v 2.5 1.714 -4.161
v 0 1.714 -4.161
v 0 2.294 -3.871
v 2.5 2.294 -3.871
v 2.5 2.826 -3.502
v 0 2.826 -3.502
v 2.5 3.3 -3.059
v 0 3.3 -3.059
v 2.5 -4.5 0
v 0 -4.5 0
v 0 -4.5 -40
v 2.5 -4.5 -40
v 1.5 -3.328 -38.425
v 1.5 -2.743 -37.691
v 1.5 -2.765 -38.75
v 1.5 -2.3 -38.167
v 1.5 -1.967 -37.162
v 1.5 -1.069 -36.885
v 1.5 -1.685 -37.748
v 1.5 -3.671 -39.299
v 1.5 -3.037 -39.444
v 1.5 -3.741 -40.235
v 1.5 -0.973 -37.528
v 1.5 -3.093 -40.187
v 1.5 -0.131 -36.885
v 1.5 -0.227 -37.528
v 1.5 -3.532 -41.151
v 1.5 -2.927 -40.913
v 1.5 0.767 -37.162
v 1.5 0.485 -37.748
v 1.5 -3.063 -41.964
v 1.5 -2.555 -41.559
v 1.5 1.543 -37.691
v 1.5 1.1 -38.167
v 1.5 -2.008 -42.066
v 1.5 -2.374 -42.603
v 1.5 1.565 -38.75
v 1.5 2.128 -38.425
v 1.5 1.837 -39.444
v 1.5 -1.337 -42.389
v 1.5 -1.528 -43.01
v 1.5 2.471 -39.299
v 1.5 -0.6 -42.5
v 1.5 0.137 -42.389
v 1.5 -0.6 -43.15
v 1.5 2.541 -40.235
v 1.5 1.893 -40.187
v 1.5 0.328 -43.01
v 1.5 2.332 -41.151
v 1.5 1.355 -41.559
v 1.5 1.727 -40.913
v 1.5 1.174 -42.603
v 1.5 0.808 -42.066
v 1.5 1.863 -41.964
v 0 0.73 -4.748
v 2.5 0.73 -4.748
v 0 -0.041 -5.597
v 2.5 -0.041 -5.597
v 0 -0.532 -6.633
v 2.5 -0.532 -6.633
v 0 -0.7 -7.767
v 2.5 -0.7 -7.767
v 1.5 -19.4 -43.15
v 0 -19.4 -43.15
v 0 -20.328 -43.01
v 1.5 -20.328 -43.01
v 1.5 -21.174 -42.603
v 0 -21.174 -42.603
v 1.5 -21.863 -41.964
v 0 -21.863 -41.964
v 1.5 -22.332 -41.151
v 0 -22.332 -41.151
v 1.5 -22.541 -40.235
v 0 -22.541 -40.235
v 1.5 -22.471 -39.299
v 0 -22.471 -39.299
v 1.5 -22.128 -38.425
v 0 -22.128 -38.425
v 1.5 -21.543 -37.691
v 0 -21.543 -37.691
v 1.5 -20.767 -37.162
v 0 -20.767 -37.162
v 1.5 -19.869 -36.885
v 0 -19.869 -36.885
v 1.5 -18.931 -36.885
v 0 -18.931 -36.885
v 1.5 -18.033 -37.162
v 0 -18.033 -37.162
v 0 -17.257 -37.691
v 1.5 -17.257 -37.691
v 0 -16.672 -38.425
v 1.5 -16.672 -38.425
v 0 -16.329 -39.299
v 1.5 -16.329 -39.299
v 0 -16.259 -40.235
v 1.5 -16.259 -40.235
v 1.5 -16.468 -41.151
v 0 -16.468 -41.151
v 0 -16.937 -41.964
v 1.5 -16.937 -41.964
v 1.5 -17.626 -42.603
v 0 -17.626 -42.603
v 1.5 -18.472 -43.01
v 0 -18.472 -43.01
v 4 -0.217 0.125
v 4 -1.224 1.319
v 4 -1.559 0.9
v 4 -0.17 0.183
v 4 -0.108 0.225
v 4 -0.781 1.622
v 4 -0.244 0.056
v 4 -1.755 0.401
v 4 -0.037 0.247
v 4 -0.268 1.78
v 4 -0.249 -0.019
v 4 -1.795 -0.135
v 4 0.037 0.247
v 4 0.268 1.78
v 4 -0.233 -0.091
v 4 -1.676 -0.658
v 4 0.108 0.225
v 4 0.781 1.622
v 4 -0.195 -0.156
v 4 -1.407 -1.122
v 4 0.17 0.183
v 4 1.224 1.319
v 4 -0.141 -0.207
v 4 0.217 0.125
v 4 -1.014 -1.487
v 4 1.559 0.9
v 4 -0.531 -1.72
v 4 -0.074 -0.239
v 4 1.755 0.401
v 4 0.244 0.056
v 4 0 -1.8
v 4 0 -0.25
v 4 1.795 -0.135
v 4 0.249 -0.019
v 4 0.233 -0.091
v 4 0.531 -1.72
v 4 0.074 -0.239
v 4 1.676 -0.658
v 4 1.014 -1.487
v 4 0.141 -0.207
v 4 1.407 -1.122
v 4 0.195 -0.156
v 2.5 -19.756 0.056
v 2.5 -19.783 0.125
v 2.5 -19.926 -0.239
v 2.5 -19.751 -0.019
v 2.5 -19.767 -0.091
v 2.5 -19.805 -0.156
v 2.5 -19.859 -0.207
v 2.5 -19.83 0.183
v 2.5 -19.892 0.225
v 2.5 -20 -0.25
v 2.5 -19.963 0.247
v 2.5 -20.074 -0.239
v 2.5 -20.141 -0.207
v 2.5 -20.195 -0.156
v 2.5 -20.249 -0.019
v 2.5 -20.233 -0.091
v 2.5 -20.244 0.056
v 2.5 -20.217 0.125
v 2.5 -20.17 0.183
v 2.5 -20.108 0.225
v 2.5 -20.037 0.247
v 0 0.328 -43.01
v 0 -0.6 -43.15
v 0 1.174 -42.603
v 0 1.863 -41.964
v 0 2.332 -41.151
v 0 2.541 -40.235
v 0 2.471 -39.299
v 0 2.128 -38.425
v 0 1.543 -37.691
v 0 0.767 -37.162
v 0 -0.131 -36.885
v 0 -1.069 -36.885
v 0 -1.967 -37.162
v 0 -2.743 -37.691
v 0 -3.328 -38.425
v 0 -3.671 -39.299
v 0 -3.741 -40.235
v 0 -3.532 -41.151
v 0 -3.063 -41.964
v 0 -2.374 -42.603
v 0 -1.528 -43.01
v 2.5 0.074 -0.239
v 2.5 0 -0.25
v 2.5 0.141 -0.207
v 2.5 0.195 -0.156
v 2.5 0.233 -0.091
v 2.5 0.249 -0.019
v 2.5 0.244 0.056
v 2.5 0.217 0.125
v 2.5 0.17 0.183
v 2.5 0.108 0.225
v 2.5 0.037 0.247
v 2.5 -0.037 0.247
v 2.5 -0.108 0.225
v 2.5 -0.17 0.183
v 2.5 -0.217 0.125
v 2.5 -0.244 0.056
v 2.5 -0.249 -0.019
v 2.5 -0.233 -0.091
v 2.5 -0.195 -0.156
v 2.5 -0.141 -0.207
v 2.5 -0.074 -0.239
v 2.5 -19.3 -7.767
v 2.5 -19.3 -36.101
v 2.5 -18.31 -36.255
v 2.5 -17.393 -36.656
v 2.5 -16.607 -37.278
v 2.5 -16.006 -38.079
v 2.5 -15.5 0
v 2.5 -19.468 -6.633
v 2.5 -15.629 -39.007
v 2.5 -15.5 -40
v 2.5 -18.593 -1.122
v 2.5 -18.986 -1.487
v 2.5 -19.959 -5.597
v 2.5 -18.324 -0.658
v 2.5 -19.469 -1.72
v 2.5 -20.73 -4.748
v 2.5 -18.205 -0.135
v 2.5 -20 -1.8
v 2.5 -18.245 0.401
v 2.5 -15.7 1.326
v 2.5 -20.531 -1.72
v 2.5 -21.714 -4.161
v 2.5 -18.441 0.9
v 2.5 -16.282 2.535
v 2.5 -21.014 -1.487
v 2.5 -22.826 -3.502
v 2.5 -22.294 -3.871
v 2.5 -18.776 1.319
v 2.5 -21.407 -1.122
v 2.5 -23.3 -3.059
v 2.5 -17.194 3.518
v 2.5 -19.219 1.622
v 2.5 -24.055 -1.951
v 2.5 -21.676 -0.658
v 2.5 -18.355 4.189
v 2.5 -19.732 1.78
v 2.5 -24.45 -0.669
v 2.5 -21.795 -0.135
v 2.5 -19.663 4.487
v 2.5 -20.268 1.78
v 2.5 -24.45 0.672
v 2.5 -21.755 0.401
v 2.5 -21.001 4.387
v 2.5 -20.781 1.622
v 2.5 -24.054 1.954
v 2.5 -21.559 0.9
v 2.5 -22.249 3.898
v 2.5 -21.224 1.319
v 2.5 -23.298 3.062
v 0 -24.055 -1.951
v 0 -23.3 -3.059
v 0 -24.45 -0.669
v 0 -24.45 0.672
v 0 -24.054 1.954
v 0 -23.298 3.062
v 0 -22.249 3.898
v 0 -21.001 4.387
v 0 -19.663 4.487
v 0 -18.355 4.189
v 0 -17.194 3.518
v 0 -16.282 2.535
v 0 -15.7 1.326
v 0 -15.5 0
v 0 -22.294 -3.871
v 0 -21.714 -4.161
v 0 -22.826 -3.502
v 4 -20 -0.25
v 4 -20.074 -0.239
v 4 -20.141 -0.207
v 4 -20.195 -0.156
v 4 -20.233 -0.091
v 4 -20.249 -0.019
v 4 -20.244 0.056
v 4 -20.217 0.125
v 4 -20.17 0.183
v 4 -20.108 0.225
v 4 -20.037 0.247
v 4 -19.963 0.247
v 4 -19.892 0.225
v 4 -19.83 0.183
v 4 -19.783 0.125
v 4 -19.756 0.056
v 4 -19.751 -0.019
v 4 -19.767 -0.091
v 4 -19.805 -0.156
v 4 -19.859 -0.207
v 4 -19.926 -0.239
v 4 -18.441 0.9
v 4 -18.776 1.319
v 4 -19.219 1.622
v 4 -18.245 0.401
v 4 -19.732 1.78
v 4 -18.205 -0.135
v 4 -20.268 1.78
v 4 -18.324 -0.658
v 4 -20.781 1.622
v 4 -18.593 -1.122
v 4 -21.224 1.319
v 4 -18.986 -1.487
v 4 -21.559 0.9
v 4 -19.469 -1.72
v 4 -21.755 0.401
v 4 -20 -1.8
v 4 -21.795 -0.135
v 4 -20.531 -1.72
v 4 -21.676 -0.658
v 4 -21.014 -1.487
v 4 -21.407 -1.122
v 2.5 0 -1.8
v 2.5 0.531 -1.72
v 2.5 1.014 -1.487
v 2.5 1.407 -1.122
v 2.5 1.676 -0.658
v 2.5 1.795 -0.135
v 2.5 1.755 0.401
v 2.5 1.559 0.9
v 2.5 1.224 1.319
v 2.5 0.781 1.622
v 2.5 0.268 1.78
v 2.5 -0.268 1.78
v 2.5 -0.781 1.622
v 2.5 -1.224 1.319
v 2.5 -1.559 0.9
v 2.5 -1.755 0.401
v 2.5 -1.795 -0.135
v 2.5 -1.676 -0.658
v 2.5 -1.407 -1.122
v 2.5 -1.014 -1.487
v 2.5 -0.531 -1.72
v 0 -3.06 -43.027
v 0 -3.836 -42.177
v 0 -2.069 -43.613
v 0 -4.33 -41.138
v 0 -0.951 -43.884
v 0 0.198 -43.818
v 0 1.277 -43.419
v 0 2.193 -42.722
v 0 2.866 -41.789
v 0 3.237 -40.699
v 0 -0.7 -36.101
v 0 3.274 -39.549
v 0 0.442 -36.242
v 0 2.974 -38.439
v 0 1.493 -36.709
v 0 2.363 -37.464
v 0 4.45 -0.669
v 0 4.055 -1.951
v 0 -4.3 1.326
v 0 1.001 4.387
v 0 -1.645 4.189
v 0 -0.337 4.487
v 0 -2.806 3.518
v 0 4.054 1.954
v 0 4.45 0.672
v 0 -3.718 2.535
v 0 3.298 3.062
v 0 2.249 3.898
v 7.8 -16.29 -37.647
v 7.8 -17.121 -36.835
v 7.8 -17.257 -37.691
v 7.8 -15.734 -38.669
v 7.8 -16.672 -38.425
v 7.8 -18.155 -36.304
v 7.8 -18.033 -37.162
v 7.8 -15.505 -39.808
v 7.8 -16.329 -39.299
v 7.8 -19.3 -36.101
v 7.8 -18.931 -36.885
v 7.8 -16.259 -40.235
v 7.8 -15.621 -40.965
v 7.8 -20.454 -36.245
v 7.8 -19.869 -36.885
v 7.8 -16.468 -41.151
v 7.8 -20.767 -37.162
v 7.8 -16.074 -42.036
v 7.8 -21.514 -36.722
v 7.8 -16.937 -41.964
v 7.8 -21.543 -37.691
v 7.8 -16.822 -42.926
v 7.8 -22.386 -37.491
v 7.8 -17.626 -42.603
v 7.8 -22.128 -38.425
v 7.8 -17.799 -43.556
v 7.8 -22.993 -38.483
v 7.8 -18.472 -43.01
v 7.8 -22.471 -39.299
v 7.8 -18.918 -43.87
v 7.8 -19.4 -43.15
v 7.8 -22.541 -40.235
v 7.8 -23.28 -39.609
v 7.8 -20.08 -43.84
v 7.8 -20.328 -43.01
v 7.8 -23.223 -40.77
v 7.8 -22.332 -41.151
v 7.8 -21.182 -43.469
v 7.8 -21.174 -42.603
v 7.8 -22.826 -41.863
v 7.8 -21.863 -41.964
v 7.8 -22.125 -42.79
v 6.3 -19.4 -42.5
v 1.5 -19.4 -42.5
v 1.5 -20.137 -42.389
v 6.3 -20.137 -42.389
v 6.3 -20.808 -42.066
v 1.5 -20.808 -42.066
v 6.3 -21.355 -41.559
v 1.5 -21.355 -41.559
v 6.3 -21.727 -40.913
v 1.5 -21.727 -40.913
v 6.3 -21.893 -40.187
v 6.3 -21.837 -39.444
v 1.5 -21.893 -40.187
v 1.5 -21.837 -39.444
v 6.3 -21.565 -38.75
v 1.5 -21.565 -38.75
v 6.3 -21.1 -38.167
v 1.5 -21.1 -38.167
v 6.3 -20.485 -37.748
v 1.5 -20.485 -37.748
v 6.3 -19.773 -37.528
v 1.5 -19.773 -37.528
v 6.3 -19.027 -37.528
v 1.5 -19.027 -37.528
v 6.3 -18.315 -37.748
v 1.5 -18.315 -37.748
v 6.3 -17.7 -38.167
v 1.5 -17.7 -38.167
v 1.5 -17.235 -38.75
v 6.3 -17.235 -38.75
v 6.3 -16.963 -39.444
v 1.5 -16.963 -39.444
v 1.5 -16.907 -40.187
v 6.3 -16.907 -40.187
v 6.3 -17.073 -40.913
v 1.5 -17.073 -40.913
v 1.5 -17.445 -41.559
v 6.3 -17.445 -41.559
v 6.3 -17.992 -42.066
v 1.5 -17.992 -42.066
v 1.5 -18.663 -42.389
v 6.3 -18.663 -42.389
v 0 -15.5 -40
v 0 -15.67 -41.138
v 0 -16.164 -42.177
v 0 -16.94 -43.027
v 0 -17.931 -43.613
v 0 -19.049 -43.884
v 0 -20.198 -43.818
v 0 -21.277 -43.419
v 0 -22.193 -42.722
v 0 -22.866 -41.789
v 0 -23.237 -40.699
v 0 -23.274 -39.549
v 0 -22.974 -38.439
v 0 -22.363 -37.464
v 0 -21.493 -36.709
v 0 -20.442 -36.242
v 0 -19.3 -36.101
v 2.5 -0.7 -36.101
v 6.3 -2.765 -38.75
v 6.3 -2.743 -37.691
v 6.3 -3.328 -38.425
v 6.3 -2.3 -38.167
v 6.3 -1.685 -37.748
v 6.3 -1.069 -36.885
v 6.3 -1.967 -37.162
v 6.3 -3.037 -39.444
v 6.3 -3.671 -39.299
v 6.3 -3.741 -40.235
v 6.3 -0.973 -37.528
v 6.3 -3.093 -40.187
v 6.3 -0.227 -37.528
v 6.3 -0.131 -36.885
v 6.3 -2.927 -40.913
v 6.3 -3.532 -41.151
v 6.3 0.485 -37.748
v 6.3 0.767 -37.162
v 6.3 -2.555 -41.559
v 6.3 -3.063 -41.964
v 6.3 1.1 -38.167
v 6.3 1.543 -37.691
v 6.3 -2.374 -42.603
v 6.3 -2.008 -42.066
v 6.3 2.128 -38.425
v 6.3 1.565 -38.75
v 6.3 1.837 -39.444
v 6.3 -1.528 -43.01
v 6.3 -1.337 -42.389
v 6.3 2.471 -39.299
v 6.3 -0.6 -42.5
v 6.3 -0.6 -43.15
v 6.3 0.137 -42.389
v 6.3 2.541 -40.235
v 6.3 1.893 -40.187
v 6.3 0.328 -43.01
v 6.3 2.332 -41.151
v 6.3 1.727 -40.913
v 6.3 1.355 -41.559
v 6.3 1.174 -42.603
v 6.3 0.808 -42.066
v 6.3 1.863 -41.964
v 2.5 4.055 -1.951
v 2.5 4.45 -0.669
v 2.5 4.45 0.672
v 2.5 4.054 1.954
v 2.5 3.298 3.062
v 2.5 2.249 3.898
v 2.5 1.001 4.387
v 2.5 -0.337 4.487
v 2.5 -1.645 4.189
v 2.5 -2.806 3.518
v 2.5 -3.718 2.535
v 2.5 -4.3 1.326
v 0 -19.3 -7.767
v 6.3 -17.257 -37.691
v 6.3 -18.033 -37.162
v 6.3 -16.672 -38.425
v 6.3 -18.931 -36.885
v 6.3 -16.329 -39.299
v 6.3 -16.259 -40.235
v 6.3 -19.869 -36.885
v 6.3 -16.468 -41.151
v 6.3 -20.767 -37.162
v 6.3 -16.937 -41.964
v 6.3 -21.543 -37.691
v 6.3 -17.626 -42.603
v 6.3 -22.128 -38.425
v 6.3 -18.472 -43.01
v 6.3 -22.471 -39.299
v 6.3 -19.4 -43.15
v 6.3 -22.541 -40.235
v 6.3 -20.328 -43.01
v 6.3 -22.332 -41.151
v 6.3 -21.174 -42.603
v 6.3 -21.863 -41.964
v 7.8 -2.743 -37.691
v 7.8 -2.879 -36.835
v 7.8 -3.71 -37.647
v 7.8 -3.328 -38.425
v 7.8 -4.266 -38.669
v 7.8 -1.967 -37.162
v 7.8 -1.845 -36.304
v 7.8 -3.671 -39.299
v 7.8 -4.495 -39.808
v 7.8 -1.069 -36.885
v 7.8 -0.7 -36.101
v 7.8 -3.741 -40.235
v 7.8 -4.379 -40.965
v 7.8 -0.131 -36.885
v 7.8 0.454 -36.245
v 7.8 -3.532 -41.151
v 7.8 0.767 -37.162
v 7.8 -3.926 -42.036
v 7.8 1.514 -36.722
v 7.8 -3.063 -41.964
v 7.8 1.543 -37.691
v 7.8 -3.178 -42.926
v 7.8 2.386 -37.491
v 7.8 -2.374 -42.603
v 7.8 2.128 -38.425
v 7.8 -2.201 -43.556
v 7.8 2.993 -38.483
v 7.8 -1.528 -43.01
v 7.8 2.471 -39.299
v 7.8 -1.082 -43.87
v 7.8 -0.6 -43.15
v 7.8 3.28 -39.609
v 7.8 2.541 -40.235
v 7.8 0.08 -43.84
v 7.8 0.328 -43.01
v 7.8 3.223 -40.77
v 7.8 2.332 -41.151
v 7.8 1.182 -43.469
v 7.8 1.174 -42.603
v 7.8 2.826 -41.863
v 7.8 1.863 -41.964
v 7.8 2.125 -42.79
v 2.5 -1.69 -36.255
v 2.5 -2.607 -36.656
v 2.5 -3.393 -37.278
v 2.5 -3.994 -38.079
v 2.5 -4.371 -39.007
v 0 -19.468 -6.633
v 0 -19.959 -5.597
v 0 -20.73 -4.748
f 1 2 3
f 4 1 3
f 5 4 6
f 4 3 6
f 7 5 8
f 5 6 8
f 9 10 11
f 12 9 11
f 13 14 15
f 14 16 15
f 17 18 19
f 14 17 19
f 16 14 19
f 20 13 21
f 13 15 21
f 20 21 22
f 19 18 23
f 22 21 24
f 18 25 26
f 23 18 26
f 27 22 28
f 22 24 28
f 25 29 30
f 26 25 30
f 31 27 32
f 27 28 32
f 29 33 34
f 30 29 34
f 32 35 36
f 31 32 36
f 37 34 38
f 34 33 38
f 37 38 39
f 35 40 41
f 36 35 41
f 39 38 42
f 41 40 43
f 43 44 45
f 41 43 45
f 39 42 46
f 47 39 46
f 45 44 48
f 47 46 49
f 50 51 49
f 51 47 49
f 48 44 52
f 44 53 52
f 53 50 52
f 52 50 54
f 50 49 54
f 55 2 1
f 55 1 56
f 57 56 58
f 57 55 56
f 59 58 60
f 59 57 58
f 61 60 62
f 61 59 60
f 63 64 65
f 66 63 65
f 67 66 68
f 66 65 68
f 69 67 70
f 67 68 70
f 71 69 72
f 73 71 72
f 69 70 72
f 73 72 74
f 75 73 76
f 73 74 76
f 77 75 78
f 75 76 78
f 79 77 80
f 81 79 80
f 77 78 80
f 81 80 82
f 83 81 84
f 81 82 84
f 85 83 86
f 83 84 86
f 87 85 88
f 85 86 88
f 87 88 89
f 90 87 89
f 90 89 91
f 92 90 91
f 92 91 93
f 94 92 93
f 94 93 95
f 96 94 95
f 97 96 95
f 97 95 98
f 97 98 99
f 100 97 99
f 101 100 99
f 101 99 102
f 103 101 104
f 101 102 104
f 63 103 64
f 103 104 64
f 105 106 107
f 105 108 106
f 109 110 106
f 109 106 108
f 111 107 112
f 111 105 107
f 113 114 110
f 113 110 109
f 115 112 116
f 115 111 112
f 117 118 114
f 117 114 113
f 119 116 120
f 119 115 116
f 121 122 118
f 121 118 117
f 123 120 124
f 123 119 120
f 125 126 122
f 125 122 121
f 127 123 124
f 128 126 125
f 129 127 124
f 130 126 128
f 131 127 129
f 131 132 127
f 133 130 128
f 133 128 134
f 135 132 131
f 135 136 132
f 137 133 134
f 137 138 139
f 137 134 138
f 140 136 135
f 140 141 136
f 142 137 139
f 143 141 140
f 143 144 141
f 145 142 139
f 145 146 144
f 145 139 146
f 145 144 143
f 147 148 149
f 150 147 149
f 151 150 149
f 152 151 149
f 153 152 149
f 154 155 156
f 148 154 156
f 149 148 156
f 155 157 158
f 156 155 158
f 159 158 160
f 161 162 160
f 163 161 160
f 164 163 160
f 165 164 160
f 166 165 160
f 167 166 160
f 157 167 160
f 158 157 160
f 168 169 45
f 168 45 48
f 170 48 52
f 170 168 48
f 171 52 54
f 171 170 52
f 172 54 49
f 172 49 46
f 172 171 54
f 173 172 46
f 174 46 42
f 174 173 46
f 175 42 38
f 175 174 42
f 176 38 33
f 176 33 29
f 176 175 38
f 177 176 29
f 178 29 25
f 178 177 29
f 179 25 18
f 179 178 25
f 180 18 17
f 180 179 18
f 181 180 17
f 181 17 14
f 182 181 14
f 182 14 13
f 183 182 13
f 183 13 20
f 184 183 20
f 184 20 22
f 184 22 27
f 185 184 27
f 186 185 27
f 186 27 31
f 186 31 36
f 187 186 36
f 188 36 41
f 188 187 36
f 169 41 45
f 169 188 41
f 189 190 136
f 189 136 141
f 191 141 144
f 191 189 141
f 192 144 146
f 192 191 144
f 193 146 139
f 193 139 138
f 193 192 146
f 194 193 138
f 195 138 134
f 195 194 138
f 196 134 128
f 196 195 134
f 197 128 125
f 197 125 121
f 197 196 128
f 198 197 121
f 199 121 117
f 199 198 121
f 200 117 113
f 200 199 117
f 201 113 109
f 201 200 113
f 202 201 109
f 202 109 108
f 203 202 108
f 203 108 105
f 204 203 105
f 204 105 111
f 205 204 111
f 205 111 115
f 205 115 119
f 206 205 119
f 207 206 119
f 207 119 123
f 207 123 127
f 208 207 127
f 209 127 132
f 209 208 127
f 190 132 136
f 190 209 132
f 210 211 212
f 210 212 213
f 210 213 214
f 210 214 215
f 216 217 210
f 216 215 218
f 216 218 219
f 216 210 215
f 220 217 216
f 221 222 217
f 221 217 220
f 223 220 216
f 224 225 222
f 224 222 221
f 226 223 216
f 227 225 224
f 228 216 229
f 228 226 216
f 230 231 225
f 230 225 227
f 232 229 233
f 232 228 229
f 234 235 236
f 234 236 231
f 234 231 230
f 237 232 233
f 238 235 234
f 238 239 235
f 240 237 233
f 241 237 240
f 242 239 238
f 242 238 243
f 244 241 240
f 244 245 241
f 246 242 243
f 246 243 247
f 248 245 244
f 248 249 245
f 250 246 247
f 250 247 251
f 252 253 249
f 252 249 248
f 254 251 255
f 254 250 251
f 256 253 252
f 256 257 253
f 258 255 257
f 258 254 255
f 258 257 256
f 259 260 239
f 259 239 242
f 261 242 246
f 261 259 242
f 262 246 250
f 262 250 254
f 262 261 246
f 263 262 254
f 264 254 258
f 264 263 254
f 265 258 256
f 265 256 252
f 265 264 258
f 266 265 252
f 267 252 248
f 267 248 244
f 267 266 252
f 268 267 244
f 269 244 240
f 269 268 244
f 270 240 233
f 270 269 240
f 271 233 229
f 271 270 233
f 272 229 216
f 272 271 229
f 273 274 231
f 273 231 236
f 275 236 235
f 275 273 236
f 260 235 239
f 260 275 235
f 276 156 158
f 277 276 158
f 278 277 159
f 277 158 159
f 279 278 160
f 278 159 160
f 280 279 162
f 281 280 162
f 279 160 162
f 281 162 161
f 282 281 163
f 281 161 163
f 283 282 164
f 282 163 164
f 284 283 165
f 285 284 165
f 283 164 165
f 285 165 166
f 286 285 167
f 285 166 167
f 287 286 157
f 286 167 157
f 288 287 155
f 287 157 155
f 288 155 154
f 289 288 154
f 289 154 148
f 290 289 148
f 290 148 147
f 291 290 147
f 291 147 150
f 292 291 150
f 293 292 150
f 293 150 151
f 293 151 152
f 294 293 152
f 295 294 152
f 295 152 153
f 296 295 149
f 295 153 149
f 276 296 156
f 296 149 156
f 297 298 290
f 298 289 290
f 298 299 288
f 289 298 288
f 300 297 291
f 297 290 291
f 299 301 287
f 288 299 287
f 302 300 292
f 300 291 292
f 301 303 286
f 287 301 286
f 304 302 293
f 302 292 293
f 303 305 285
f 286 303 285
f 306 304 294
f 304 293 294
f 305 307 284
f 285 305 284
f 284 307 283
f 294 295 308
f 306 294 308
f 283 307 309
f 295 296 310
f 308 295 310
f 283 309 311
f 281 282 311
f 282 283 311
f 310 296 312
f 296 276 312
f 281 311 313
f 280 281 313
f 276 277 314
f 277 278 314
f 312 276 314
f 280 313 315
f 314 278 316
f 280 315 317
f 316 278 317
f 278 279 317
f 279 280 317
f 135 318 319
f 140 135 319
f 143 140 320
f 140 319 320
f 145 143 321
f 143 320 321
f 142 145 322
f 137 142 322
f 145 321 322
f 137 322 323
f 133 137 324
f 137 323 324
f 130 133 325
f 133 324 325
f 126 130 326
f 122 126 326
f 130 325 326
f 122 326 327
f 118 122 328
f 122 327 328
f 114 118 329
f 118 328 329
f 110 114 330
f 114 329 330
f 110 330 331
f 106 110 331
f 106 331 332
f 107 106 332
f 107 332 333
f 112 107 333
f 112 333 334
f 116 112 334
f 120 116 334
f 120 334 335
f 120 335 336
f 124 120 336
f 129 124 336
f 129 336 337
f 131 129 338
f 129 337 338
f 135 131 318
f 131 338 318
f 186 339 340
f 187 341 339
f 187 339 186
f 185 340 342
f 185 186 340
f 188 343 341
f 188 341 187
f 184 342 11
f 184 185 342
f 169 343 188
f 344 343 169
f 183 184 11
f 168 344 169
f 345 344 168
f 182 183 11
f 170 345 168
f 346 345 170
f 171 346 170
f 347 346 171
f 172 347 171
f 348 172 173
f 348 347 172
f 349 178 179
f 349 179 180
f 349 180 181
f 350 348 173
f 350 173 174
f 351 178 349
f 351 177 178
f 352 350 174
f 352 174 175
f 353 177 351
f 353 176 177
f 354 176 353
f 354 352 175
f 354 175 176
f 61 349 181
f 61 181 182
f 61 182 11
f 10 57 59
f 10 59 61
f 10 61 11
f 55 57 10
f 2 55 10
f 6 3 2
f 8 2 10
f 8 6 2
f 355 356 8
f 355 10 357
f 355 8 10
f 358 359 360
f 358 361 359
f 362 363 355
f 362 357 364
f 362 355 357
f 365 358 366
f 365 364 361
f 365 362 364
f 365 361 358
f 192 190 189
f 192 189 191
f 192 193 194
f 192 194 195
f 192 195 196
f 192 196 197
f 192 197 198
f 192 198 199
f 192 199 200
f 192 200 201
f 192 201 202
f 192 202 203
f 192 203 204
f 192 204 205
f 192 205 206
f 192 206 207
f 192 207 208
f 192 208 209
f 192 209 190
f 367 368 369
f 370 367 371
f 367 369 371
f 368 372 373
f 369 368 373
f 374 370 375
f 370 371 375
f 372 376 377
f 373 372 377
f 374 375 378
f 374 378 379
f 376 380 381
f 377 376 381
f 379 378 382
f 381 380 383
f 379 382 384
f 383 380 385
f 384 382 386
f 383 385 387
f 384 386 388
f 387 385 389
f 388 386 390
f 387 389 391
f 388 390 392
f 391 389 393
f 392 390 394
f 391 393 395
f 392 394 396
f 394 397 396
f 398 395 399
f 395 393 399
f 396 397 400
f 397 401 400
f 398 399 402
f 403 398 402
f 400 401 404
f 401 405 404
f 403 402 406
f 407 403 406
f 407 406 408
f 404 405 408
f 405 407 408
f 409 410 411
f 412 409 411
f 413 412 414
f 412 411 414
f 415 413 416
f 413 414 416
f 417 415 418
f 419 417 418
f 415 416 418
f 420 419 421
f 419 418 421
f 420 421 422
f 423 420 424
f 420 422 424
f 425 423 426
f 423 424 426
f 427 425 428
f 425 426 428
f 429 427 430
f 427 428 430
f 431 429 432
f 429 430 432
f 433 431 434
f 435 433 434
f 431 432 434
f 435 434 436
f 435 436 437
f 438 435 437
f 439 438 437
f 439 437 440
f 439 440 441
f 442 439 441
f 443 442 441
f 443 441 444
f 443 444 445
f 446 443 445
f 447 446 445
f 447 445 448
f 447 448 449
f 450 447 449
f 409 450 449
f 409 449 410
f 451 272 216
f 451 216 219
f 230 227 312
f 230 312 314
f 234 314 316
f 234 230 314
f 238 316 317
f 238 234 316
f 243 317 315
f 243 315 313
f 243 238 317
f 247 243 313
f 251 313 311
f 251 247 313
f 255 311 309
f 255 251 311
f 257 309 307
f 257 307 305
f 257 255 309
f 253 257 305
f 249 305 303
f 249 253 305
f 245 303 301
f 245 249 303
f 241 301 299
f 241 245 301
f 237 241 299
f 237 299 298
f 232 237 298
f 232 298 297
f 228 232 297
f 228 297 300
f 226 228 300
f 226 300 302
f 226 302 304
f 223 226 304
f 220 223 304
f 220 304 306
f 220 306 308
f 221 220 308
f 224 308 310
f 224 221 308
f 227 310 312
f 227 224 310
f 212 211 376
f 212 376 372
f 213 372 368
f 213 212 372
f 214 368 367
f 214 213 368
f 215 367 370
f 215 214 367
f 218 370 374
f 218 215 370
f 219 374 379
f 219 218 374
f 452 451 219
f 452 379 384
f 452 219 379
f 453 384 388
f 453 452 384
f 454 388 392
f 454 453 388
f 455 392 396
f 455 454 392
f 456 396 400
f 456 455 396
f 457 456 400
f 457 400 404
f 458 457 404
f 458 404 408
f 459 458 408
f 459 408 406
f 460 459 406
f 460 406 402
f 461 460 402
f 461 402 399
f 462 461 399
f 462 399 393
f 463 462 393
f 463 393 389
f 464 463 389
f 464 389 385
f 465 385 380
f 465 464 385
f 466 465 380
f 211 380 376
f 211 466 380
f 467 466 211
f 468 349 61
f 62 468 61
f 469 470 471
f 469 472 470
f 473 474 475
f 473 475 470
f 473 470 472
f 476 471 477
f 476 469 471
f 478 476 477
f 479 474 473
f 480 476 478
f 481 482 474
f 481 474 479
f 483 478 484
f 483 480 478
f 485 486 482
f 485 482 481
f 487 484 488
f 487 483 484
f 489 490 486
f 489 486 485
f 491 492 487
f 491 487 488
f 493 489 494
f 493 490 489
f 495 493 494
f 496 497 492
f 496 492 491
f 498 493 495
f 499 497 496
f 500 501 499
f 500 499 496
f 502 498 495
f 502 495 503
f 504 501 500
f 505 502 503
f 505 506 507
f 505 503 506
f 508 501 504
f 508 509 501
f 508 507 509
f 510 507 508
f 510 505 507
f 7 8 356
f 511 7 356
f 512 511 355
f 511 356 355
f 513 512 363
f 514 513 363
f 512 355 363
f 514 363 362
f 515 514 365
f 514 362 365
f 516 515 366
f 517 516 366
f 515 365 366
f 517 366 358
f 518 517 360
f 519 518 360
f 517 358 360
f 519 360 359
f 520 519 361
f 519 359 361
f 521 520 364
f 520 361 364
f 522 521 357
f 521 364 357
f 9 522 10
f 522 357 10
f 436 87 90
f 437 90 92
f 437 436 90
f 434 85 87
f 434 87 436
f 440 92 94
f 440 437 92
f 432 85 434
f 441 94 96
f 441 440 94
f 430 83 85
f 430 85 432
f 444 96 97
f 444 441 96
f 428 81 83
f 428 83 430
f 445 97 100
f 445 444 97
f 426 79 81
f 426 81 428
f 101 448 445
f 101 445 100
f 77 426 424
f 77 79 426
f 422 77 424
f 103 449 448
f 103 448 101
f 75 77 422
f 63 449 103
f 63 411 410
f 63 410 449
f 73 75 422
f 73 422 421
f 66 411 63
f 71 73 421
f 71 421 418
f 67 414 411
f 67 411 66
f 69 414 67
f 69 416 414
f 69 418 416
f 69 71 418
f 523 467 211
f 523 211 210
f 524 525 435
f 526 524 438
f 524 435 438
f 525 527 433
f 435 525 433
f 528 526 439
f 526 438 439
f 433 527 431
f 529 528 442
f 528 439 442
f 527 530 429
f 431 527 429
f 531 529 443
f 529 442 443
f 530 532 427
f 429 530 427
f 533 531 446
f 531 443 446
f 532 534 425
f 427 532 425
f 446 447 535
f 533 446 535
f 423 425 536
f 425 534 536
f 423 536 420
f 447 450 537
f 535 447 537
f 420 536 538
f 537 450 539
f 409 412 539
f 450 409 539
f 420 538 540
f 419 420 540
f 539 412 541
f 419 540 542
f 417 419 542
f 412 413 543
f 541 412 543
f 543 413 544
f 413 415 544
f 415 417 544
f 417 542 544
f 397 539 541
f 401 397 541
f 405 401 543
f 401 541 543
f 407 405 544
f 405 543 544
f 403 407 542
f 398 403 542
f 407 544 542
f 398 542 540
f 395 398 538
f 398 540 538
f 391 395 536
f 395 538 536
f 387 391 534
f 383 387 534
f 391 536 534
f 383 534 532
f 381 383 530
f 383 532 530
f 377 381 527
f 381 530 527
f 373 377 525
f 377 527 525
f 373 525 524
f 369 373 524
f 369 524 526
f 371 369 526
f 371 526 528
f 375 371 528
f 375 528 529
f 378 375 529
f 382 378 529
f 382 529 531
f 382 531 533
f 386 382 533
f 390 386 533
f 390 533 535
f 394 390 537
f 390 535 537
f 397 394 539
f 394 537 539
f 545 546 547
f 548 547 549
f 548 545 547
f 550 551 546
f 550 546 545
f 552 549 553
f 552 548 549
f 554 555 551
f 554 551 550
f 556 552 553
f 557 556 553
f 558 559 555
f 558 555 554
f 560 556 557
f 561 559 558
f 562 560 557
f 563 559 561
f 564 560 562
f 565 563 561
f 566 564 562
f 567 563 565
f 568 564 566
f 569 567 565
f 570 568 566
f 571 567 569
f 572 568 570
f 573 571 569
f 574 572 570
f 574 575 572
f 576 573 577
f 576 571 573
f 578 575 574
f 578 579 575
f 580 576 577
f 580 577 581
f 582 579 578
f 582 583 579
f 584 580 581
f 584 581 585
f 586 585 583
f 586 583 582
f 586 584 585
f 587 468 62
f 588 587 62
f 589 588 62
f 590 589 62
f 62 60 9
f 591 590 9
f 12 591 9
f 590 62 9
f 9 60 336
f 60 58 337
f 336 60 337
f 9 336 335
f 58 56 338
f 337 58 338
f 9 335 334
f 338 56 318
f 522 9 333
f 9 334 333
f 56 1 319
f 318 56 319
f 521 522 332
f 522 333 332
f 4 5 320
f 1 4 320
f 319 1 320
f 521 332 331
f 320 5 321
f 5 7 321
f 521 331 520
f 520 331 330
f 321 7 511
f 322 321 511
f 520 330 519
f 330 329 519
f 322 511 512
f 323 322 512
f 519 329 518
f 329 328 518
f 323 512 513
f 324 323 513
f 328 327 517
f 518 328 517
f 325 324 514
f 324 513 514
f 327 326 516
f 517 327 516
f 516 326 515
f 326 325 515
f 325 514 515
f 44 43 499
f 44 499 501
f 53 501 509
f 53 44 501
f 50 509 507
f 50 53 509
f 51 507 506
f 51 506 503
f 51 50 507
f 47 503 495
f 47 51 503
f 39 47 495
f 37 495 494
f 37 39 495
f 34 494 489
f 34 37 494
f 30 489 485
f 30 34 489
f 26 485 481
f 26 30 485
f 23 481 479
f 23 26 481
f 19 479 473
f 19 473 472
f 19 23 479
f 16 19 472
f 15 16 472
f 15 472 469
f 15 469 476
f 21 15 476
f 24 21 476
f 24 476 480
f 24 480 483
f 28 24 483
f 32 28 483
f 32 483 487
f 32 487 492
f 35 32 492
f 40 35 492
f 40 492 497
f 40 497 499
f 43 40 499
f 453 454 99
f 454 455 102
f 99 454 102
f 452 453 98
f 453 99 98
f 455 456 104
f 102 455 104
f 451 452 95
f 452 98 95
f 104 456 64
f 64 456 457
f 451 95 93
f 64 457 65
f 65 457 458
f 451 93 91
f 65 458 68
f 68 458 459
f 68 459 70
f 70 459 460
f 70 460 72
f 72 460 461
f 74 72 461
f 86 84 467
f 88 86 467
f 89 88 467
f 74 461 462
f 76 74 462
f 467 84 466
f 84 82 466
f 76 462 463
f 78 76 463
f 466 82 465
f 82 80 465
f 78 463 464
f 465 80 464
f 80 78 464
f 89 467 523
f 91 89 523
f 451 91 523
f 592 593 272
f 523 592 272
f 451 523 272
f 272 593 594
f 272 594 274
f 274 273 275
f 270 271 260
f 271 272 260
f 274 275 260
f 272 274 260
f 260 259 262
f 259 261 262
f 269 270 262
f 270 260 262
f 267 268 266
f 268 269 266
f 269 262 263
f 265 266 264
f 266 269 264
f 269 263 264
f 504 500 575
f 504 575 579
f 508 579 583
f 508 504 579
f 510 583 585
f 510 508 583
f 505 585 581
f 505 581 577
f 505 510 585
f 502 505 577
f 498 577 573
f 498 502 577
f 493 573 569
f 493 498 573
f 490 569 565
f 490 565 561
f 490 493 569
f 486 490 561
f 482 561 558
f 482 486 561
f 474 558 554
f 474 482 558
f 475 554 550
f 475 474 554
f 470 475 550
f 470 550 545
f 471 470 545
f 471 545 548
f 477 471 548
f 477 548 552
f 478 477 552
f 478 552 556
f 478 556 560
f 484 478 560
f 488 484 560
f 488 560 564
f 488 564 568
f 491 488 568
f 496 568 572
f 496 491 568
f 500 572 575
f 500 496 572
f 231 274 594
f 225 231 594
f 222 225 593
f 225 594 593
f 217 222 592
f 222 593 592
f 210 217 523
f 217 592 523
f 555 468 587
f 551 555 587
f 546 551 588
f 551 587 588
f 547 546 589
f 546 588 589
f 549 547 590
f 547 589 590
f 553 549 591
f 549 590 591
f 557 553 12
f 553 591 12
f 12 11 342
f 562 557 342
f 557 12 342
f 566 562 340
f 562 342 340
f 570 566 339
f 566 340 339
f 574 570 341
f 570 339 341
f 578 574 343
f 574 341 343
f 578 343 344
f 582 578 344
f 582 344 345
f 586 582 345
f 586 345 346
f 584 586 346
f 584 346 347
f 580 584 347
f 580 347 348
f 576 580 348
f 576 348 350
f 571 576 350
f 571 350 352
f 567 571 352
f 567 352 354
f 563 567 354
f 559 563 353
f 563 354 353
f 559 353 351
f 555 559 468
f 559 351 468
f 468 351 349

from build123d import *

# Parameters (mm, degrees)
SKETCH_1_R          = 4.5
SKETCH_1_W          = 43.9
SKETCH_1_H          = 7.8
EXTRUDE_1_DEPTH     = 2.5
EXTRUDE_START       = 2.5
SKETCH_1_6_R        = 1.8
SKETCH_1_6_R_2      = 0.25
EXTRUDE_3_DEPTH     = 1.5
SKETCH_1_5_W        = 7.8
SKETCH_1_5_H        = 7.8
EXTRUDE_2_DEPTH     = 7.8
SKETCH_1_7_R        = 2.5
CUT_EXTRUDE_1_DEPTH = 45.814060294
SKETCH_1_8_R        = 3.15
SKETCH_1_8_R_2      = 2.5
CUT_EXTRUDE_2_DEPTH = 1.5
CUT_EXTRUDE_START   = 6.3
SKETCH_1_9_R        = 3.15
SKETCH_1_9_R_2      = 2.5
CUT_EXTRUDE_3_DEPTH = 1.5
CUT_EXTRUDE_4_DEPTH = 45.814060294
FILLET_1_R          = 3.9


with BuildPart() as part:
    # 草图1 → 凸台-拉伸1 (new body)
    with BuildSketch(Plane(origin=(0, 0, 0), x_dir=(0, 0, -1), z_dir=(1, 0, 0))):
        Circle(SKETCH_1_R)
        with Locations((21.95, -0.6)):
            Rectangle(SKETCH_1_W, SKETCH_1_H)
    extrude(amount=EXTRUDE_1_DEPTH)

    # 草图1<6> → 凸台-拉伸3 (add)
    with BuildSketch(Plane(origin=(0, 0, 0), x_dir=(0, 0, -1), z_dir=(1, 0, 0)).offset(EXTRUDE_START)):
        Circle(SKETCH_1_6_R)
        Circle(SKETCH_1_6_R_2, mode=Mode.SUBTRACT)
    extrude(amount=EXTRUDE_3_DEPTH)

    # 草图1<5> → 凸台-拉伸2 (add)
    with BuildSketch(Plane(origin=(0, 0, 0), x_dir=(0, 0, -1), z_dir=(1, 0, 0))):
        with Locations((40, -0.6)):
            Rectangle(SKETCH_1_5_W, SKETCH_1_5_H)
    extrude(amount=EXTRUDE_2_DEPTH)

    # 草图1<7> → 切除-拉伸1 (cut, through all)
    with BuildSketch(Plane(origin=(0, 0, 0), x_dir=(0, 0, -1), z_dir=(1, 0, 0))):
        with Locations((40, -0.6)):
            Circle(SKETCH_1_7_R)
    extrude(amount=CUT_EXTRUDE_1_DEPTH, mode=Mode.SUBTRACT)

    # 草图1<8> → 切除-拉伸2 (cut)
    with BuildSketch(Plane(origin=(0, 0, 0), x_dir=(0, 0, -1), z_dir=(1, 0, 0))):
        with Locations((40, -0.6)):
            Circle(SKETCH_1_8_R)
        with Locations((40, -0.6)):
            Circle(SKETCH_1_8_R_2, mode=Mode.SUBTRACT)
    extrude(amount=CUT_EXTRUDE_2_DEPTH, mode=Mode.SUBTRACT)

    # 草图1<9> → 切除-拉伸3 (cut)
    with BuildSketch(Plane(origin=(0, 0, 0), x_dir=(0, 0, -1), z_dir=(1, 0, 0)).offset(CUT_EXTRUDE_START)):
        with Locations((40, -0.6)):
            Circle(SKETCH_1_9_R)
        with Locations((40, -0.6)):
            Circle(SKETCH_1_9_R_2, mode=Mode.SUBTRACT)
    extrude(amount=CUT_EXTRUDE_3_DEPTH, mode=Mode.SUBTRACT)

    # 草图2 → 切除-拉伸4 (cut, through all)
    with BuildSketch(Plane.ZY):
        Polygon((-4.5, 3.3), (-36.1, 3.3), (-36.1, -0.7), (-4.5, -0.7), (-4.5, 0), align=None)
        with BuildLine():
            Line((-3.059411708, 3.3), (-4.5, 3.3))
            Line((-4.5, 3.3), (-4.5, 0))
            ThreePointArc((-4.5, 0), (-4.124157653, 1.800367645), (-3.059411708, 3.3))
        make_face()
    extrude(amount=-CUT_EXTRUDE_4_DEPTH, mode=Mode.SUBTRACT)

    # 圆角1
    # the kernel refuses this fillet: 3.9 mm, written as the material it adds along each edge
    with BuildSketch(Plane(origin=(0, -0.7, -4.5), x_dir=(0, 0, -1), z_dir=(1, 0, 0))) as fillet_1_piece_1:
        with BuildLine():
            CenterArc((3.266595136, 3.9), FILLET_1_R, 202.392687805, 67.607312195)
            Line((-0.339324035, 2.414285714), (-0.699915952, 2.265714286))
            ThreePointArc((-0.699915952, 2.265714286), (-0.39, 0.7), (-0.39, 0))
            Line((-0.39, 0), (0, -0.39))
            Line((0, -0.39), (3.266595136, -0.39))
            Line((3.266595136, -0.39), (3.266595136, 0))
        make_face()
    extrude(amount=2.5)
    # the kernel refuses this fillet: 3.9 mm, written as the material it takes off along each edge
    with BuildSketch(Plane(origin=(-9.75, -4.5, -43.9), x_dir=(0, 1, 0), z_dir=(1, 0, 0))) as fillet_1_2_piece_1:
        with BuildLine():
            CenterArc((FILLET_1_R, FILLET_1_R), FILLET_1_R, 180, 90)
            Line((0, FILLET_1_R), (0, 0))
            Line((0, 0), (FILLET_1_R, 0))
        make_face()
    extrude(amount=27.3, mode=Mode.SUBTRACT)
    with BuildSketch(Plane(origin=(17.55, 3.3, -43.9), x_dir=(0, 0, 1), z_dir=(-1, 0, 0)), Plane(origin=(17.55, 3.3, -36.1), x_dir=(0, -1, 0), z_dir=(-1, 0, 0))) as fillet_1_2_piece_2:
        with BuildLine():
            CenterArc((FILLET_1_R, -FILLET_1_R), FILLET_1_R, 90, 90)
            Line((0, -FILLET_1_R), (0, 0))
            Line((0, 0), (FILLET_1_R, 0))
        make_face()
    extrude(amount=27.3, mode=Mode.SUBTRACT)
    with BuildSketch(Plane(origin=(-7.25, -4.5, -36.1), x_dir=(0, 1, 0), z_dir=(1, 0, 0))) as fillet_1_2_piece_3_section:
        with BuildLine():
            CenterArc((FILLET_1_R, -FILLET_1_R), FILLET_1_R, 90, 90)
            Line((0, -FILLET_1_R), (0, 0))
            Line((0, 0), (FILLET_1_R, 0))
        make_face()
    fillet_1_2_piece_3 = extrude(amount=24.8, mode=Mode.PRIVATE)
    fillet_1_2_piece_3 = split(fillet_1_2_piece_3, bisect_by=Plane(origin=(1.25, -0.7, -36.100384668), z_dir=(0, 1, 0)), keep=Keep.TOP, mode=Mode.PRIVATE)
    add(fillet_1_2_piece_3, mode=Mode.SUBTRACT)
    with BuildSketch(Plane(origin=(2.5, -4.5, -36.1), x_dir=(0, 1, 0), z_dir=(1, 0, 0))) as fillet_1_2_piece_4:
        with BuildLine():
            CenterArc((FILLET_1_R, -FILLET_1_R), FILLET_1_R, 90, 90)
            Line((0, -FILLET_1_R), (0, 0))
            Line((0, 0), (FILLET_1_R, 0))
        make_face()
    extrude(amount=15.05, mode=Mode.SUBTRACT)


with BuildPart() as body_2:
    # 镜向2: mirrored copy
    add(part.part.mirror(Plane.ZX.offset(-10)))


solid = Compound([part.part, body_2.part])
